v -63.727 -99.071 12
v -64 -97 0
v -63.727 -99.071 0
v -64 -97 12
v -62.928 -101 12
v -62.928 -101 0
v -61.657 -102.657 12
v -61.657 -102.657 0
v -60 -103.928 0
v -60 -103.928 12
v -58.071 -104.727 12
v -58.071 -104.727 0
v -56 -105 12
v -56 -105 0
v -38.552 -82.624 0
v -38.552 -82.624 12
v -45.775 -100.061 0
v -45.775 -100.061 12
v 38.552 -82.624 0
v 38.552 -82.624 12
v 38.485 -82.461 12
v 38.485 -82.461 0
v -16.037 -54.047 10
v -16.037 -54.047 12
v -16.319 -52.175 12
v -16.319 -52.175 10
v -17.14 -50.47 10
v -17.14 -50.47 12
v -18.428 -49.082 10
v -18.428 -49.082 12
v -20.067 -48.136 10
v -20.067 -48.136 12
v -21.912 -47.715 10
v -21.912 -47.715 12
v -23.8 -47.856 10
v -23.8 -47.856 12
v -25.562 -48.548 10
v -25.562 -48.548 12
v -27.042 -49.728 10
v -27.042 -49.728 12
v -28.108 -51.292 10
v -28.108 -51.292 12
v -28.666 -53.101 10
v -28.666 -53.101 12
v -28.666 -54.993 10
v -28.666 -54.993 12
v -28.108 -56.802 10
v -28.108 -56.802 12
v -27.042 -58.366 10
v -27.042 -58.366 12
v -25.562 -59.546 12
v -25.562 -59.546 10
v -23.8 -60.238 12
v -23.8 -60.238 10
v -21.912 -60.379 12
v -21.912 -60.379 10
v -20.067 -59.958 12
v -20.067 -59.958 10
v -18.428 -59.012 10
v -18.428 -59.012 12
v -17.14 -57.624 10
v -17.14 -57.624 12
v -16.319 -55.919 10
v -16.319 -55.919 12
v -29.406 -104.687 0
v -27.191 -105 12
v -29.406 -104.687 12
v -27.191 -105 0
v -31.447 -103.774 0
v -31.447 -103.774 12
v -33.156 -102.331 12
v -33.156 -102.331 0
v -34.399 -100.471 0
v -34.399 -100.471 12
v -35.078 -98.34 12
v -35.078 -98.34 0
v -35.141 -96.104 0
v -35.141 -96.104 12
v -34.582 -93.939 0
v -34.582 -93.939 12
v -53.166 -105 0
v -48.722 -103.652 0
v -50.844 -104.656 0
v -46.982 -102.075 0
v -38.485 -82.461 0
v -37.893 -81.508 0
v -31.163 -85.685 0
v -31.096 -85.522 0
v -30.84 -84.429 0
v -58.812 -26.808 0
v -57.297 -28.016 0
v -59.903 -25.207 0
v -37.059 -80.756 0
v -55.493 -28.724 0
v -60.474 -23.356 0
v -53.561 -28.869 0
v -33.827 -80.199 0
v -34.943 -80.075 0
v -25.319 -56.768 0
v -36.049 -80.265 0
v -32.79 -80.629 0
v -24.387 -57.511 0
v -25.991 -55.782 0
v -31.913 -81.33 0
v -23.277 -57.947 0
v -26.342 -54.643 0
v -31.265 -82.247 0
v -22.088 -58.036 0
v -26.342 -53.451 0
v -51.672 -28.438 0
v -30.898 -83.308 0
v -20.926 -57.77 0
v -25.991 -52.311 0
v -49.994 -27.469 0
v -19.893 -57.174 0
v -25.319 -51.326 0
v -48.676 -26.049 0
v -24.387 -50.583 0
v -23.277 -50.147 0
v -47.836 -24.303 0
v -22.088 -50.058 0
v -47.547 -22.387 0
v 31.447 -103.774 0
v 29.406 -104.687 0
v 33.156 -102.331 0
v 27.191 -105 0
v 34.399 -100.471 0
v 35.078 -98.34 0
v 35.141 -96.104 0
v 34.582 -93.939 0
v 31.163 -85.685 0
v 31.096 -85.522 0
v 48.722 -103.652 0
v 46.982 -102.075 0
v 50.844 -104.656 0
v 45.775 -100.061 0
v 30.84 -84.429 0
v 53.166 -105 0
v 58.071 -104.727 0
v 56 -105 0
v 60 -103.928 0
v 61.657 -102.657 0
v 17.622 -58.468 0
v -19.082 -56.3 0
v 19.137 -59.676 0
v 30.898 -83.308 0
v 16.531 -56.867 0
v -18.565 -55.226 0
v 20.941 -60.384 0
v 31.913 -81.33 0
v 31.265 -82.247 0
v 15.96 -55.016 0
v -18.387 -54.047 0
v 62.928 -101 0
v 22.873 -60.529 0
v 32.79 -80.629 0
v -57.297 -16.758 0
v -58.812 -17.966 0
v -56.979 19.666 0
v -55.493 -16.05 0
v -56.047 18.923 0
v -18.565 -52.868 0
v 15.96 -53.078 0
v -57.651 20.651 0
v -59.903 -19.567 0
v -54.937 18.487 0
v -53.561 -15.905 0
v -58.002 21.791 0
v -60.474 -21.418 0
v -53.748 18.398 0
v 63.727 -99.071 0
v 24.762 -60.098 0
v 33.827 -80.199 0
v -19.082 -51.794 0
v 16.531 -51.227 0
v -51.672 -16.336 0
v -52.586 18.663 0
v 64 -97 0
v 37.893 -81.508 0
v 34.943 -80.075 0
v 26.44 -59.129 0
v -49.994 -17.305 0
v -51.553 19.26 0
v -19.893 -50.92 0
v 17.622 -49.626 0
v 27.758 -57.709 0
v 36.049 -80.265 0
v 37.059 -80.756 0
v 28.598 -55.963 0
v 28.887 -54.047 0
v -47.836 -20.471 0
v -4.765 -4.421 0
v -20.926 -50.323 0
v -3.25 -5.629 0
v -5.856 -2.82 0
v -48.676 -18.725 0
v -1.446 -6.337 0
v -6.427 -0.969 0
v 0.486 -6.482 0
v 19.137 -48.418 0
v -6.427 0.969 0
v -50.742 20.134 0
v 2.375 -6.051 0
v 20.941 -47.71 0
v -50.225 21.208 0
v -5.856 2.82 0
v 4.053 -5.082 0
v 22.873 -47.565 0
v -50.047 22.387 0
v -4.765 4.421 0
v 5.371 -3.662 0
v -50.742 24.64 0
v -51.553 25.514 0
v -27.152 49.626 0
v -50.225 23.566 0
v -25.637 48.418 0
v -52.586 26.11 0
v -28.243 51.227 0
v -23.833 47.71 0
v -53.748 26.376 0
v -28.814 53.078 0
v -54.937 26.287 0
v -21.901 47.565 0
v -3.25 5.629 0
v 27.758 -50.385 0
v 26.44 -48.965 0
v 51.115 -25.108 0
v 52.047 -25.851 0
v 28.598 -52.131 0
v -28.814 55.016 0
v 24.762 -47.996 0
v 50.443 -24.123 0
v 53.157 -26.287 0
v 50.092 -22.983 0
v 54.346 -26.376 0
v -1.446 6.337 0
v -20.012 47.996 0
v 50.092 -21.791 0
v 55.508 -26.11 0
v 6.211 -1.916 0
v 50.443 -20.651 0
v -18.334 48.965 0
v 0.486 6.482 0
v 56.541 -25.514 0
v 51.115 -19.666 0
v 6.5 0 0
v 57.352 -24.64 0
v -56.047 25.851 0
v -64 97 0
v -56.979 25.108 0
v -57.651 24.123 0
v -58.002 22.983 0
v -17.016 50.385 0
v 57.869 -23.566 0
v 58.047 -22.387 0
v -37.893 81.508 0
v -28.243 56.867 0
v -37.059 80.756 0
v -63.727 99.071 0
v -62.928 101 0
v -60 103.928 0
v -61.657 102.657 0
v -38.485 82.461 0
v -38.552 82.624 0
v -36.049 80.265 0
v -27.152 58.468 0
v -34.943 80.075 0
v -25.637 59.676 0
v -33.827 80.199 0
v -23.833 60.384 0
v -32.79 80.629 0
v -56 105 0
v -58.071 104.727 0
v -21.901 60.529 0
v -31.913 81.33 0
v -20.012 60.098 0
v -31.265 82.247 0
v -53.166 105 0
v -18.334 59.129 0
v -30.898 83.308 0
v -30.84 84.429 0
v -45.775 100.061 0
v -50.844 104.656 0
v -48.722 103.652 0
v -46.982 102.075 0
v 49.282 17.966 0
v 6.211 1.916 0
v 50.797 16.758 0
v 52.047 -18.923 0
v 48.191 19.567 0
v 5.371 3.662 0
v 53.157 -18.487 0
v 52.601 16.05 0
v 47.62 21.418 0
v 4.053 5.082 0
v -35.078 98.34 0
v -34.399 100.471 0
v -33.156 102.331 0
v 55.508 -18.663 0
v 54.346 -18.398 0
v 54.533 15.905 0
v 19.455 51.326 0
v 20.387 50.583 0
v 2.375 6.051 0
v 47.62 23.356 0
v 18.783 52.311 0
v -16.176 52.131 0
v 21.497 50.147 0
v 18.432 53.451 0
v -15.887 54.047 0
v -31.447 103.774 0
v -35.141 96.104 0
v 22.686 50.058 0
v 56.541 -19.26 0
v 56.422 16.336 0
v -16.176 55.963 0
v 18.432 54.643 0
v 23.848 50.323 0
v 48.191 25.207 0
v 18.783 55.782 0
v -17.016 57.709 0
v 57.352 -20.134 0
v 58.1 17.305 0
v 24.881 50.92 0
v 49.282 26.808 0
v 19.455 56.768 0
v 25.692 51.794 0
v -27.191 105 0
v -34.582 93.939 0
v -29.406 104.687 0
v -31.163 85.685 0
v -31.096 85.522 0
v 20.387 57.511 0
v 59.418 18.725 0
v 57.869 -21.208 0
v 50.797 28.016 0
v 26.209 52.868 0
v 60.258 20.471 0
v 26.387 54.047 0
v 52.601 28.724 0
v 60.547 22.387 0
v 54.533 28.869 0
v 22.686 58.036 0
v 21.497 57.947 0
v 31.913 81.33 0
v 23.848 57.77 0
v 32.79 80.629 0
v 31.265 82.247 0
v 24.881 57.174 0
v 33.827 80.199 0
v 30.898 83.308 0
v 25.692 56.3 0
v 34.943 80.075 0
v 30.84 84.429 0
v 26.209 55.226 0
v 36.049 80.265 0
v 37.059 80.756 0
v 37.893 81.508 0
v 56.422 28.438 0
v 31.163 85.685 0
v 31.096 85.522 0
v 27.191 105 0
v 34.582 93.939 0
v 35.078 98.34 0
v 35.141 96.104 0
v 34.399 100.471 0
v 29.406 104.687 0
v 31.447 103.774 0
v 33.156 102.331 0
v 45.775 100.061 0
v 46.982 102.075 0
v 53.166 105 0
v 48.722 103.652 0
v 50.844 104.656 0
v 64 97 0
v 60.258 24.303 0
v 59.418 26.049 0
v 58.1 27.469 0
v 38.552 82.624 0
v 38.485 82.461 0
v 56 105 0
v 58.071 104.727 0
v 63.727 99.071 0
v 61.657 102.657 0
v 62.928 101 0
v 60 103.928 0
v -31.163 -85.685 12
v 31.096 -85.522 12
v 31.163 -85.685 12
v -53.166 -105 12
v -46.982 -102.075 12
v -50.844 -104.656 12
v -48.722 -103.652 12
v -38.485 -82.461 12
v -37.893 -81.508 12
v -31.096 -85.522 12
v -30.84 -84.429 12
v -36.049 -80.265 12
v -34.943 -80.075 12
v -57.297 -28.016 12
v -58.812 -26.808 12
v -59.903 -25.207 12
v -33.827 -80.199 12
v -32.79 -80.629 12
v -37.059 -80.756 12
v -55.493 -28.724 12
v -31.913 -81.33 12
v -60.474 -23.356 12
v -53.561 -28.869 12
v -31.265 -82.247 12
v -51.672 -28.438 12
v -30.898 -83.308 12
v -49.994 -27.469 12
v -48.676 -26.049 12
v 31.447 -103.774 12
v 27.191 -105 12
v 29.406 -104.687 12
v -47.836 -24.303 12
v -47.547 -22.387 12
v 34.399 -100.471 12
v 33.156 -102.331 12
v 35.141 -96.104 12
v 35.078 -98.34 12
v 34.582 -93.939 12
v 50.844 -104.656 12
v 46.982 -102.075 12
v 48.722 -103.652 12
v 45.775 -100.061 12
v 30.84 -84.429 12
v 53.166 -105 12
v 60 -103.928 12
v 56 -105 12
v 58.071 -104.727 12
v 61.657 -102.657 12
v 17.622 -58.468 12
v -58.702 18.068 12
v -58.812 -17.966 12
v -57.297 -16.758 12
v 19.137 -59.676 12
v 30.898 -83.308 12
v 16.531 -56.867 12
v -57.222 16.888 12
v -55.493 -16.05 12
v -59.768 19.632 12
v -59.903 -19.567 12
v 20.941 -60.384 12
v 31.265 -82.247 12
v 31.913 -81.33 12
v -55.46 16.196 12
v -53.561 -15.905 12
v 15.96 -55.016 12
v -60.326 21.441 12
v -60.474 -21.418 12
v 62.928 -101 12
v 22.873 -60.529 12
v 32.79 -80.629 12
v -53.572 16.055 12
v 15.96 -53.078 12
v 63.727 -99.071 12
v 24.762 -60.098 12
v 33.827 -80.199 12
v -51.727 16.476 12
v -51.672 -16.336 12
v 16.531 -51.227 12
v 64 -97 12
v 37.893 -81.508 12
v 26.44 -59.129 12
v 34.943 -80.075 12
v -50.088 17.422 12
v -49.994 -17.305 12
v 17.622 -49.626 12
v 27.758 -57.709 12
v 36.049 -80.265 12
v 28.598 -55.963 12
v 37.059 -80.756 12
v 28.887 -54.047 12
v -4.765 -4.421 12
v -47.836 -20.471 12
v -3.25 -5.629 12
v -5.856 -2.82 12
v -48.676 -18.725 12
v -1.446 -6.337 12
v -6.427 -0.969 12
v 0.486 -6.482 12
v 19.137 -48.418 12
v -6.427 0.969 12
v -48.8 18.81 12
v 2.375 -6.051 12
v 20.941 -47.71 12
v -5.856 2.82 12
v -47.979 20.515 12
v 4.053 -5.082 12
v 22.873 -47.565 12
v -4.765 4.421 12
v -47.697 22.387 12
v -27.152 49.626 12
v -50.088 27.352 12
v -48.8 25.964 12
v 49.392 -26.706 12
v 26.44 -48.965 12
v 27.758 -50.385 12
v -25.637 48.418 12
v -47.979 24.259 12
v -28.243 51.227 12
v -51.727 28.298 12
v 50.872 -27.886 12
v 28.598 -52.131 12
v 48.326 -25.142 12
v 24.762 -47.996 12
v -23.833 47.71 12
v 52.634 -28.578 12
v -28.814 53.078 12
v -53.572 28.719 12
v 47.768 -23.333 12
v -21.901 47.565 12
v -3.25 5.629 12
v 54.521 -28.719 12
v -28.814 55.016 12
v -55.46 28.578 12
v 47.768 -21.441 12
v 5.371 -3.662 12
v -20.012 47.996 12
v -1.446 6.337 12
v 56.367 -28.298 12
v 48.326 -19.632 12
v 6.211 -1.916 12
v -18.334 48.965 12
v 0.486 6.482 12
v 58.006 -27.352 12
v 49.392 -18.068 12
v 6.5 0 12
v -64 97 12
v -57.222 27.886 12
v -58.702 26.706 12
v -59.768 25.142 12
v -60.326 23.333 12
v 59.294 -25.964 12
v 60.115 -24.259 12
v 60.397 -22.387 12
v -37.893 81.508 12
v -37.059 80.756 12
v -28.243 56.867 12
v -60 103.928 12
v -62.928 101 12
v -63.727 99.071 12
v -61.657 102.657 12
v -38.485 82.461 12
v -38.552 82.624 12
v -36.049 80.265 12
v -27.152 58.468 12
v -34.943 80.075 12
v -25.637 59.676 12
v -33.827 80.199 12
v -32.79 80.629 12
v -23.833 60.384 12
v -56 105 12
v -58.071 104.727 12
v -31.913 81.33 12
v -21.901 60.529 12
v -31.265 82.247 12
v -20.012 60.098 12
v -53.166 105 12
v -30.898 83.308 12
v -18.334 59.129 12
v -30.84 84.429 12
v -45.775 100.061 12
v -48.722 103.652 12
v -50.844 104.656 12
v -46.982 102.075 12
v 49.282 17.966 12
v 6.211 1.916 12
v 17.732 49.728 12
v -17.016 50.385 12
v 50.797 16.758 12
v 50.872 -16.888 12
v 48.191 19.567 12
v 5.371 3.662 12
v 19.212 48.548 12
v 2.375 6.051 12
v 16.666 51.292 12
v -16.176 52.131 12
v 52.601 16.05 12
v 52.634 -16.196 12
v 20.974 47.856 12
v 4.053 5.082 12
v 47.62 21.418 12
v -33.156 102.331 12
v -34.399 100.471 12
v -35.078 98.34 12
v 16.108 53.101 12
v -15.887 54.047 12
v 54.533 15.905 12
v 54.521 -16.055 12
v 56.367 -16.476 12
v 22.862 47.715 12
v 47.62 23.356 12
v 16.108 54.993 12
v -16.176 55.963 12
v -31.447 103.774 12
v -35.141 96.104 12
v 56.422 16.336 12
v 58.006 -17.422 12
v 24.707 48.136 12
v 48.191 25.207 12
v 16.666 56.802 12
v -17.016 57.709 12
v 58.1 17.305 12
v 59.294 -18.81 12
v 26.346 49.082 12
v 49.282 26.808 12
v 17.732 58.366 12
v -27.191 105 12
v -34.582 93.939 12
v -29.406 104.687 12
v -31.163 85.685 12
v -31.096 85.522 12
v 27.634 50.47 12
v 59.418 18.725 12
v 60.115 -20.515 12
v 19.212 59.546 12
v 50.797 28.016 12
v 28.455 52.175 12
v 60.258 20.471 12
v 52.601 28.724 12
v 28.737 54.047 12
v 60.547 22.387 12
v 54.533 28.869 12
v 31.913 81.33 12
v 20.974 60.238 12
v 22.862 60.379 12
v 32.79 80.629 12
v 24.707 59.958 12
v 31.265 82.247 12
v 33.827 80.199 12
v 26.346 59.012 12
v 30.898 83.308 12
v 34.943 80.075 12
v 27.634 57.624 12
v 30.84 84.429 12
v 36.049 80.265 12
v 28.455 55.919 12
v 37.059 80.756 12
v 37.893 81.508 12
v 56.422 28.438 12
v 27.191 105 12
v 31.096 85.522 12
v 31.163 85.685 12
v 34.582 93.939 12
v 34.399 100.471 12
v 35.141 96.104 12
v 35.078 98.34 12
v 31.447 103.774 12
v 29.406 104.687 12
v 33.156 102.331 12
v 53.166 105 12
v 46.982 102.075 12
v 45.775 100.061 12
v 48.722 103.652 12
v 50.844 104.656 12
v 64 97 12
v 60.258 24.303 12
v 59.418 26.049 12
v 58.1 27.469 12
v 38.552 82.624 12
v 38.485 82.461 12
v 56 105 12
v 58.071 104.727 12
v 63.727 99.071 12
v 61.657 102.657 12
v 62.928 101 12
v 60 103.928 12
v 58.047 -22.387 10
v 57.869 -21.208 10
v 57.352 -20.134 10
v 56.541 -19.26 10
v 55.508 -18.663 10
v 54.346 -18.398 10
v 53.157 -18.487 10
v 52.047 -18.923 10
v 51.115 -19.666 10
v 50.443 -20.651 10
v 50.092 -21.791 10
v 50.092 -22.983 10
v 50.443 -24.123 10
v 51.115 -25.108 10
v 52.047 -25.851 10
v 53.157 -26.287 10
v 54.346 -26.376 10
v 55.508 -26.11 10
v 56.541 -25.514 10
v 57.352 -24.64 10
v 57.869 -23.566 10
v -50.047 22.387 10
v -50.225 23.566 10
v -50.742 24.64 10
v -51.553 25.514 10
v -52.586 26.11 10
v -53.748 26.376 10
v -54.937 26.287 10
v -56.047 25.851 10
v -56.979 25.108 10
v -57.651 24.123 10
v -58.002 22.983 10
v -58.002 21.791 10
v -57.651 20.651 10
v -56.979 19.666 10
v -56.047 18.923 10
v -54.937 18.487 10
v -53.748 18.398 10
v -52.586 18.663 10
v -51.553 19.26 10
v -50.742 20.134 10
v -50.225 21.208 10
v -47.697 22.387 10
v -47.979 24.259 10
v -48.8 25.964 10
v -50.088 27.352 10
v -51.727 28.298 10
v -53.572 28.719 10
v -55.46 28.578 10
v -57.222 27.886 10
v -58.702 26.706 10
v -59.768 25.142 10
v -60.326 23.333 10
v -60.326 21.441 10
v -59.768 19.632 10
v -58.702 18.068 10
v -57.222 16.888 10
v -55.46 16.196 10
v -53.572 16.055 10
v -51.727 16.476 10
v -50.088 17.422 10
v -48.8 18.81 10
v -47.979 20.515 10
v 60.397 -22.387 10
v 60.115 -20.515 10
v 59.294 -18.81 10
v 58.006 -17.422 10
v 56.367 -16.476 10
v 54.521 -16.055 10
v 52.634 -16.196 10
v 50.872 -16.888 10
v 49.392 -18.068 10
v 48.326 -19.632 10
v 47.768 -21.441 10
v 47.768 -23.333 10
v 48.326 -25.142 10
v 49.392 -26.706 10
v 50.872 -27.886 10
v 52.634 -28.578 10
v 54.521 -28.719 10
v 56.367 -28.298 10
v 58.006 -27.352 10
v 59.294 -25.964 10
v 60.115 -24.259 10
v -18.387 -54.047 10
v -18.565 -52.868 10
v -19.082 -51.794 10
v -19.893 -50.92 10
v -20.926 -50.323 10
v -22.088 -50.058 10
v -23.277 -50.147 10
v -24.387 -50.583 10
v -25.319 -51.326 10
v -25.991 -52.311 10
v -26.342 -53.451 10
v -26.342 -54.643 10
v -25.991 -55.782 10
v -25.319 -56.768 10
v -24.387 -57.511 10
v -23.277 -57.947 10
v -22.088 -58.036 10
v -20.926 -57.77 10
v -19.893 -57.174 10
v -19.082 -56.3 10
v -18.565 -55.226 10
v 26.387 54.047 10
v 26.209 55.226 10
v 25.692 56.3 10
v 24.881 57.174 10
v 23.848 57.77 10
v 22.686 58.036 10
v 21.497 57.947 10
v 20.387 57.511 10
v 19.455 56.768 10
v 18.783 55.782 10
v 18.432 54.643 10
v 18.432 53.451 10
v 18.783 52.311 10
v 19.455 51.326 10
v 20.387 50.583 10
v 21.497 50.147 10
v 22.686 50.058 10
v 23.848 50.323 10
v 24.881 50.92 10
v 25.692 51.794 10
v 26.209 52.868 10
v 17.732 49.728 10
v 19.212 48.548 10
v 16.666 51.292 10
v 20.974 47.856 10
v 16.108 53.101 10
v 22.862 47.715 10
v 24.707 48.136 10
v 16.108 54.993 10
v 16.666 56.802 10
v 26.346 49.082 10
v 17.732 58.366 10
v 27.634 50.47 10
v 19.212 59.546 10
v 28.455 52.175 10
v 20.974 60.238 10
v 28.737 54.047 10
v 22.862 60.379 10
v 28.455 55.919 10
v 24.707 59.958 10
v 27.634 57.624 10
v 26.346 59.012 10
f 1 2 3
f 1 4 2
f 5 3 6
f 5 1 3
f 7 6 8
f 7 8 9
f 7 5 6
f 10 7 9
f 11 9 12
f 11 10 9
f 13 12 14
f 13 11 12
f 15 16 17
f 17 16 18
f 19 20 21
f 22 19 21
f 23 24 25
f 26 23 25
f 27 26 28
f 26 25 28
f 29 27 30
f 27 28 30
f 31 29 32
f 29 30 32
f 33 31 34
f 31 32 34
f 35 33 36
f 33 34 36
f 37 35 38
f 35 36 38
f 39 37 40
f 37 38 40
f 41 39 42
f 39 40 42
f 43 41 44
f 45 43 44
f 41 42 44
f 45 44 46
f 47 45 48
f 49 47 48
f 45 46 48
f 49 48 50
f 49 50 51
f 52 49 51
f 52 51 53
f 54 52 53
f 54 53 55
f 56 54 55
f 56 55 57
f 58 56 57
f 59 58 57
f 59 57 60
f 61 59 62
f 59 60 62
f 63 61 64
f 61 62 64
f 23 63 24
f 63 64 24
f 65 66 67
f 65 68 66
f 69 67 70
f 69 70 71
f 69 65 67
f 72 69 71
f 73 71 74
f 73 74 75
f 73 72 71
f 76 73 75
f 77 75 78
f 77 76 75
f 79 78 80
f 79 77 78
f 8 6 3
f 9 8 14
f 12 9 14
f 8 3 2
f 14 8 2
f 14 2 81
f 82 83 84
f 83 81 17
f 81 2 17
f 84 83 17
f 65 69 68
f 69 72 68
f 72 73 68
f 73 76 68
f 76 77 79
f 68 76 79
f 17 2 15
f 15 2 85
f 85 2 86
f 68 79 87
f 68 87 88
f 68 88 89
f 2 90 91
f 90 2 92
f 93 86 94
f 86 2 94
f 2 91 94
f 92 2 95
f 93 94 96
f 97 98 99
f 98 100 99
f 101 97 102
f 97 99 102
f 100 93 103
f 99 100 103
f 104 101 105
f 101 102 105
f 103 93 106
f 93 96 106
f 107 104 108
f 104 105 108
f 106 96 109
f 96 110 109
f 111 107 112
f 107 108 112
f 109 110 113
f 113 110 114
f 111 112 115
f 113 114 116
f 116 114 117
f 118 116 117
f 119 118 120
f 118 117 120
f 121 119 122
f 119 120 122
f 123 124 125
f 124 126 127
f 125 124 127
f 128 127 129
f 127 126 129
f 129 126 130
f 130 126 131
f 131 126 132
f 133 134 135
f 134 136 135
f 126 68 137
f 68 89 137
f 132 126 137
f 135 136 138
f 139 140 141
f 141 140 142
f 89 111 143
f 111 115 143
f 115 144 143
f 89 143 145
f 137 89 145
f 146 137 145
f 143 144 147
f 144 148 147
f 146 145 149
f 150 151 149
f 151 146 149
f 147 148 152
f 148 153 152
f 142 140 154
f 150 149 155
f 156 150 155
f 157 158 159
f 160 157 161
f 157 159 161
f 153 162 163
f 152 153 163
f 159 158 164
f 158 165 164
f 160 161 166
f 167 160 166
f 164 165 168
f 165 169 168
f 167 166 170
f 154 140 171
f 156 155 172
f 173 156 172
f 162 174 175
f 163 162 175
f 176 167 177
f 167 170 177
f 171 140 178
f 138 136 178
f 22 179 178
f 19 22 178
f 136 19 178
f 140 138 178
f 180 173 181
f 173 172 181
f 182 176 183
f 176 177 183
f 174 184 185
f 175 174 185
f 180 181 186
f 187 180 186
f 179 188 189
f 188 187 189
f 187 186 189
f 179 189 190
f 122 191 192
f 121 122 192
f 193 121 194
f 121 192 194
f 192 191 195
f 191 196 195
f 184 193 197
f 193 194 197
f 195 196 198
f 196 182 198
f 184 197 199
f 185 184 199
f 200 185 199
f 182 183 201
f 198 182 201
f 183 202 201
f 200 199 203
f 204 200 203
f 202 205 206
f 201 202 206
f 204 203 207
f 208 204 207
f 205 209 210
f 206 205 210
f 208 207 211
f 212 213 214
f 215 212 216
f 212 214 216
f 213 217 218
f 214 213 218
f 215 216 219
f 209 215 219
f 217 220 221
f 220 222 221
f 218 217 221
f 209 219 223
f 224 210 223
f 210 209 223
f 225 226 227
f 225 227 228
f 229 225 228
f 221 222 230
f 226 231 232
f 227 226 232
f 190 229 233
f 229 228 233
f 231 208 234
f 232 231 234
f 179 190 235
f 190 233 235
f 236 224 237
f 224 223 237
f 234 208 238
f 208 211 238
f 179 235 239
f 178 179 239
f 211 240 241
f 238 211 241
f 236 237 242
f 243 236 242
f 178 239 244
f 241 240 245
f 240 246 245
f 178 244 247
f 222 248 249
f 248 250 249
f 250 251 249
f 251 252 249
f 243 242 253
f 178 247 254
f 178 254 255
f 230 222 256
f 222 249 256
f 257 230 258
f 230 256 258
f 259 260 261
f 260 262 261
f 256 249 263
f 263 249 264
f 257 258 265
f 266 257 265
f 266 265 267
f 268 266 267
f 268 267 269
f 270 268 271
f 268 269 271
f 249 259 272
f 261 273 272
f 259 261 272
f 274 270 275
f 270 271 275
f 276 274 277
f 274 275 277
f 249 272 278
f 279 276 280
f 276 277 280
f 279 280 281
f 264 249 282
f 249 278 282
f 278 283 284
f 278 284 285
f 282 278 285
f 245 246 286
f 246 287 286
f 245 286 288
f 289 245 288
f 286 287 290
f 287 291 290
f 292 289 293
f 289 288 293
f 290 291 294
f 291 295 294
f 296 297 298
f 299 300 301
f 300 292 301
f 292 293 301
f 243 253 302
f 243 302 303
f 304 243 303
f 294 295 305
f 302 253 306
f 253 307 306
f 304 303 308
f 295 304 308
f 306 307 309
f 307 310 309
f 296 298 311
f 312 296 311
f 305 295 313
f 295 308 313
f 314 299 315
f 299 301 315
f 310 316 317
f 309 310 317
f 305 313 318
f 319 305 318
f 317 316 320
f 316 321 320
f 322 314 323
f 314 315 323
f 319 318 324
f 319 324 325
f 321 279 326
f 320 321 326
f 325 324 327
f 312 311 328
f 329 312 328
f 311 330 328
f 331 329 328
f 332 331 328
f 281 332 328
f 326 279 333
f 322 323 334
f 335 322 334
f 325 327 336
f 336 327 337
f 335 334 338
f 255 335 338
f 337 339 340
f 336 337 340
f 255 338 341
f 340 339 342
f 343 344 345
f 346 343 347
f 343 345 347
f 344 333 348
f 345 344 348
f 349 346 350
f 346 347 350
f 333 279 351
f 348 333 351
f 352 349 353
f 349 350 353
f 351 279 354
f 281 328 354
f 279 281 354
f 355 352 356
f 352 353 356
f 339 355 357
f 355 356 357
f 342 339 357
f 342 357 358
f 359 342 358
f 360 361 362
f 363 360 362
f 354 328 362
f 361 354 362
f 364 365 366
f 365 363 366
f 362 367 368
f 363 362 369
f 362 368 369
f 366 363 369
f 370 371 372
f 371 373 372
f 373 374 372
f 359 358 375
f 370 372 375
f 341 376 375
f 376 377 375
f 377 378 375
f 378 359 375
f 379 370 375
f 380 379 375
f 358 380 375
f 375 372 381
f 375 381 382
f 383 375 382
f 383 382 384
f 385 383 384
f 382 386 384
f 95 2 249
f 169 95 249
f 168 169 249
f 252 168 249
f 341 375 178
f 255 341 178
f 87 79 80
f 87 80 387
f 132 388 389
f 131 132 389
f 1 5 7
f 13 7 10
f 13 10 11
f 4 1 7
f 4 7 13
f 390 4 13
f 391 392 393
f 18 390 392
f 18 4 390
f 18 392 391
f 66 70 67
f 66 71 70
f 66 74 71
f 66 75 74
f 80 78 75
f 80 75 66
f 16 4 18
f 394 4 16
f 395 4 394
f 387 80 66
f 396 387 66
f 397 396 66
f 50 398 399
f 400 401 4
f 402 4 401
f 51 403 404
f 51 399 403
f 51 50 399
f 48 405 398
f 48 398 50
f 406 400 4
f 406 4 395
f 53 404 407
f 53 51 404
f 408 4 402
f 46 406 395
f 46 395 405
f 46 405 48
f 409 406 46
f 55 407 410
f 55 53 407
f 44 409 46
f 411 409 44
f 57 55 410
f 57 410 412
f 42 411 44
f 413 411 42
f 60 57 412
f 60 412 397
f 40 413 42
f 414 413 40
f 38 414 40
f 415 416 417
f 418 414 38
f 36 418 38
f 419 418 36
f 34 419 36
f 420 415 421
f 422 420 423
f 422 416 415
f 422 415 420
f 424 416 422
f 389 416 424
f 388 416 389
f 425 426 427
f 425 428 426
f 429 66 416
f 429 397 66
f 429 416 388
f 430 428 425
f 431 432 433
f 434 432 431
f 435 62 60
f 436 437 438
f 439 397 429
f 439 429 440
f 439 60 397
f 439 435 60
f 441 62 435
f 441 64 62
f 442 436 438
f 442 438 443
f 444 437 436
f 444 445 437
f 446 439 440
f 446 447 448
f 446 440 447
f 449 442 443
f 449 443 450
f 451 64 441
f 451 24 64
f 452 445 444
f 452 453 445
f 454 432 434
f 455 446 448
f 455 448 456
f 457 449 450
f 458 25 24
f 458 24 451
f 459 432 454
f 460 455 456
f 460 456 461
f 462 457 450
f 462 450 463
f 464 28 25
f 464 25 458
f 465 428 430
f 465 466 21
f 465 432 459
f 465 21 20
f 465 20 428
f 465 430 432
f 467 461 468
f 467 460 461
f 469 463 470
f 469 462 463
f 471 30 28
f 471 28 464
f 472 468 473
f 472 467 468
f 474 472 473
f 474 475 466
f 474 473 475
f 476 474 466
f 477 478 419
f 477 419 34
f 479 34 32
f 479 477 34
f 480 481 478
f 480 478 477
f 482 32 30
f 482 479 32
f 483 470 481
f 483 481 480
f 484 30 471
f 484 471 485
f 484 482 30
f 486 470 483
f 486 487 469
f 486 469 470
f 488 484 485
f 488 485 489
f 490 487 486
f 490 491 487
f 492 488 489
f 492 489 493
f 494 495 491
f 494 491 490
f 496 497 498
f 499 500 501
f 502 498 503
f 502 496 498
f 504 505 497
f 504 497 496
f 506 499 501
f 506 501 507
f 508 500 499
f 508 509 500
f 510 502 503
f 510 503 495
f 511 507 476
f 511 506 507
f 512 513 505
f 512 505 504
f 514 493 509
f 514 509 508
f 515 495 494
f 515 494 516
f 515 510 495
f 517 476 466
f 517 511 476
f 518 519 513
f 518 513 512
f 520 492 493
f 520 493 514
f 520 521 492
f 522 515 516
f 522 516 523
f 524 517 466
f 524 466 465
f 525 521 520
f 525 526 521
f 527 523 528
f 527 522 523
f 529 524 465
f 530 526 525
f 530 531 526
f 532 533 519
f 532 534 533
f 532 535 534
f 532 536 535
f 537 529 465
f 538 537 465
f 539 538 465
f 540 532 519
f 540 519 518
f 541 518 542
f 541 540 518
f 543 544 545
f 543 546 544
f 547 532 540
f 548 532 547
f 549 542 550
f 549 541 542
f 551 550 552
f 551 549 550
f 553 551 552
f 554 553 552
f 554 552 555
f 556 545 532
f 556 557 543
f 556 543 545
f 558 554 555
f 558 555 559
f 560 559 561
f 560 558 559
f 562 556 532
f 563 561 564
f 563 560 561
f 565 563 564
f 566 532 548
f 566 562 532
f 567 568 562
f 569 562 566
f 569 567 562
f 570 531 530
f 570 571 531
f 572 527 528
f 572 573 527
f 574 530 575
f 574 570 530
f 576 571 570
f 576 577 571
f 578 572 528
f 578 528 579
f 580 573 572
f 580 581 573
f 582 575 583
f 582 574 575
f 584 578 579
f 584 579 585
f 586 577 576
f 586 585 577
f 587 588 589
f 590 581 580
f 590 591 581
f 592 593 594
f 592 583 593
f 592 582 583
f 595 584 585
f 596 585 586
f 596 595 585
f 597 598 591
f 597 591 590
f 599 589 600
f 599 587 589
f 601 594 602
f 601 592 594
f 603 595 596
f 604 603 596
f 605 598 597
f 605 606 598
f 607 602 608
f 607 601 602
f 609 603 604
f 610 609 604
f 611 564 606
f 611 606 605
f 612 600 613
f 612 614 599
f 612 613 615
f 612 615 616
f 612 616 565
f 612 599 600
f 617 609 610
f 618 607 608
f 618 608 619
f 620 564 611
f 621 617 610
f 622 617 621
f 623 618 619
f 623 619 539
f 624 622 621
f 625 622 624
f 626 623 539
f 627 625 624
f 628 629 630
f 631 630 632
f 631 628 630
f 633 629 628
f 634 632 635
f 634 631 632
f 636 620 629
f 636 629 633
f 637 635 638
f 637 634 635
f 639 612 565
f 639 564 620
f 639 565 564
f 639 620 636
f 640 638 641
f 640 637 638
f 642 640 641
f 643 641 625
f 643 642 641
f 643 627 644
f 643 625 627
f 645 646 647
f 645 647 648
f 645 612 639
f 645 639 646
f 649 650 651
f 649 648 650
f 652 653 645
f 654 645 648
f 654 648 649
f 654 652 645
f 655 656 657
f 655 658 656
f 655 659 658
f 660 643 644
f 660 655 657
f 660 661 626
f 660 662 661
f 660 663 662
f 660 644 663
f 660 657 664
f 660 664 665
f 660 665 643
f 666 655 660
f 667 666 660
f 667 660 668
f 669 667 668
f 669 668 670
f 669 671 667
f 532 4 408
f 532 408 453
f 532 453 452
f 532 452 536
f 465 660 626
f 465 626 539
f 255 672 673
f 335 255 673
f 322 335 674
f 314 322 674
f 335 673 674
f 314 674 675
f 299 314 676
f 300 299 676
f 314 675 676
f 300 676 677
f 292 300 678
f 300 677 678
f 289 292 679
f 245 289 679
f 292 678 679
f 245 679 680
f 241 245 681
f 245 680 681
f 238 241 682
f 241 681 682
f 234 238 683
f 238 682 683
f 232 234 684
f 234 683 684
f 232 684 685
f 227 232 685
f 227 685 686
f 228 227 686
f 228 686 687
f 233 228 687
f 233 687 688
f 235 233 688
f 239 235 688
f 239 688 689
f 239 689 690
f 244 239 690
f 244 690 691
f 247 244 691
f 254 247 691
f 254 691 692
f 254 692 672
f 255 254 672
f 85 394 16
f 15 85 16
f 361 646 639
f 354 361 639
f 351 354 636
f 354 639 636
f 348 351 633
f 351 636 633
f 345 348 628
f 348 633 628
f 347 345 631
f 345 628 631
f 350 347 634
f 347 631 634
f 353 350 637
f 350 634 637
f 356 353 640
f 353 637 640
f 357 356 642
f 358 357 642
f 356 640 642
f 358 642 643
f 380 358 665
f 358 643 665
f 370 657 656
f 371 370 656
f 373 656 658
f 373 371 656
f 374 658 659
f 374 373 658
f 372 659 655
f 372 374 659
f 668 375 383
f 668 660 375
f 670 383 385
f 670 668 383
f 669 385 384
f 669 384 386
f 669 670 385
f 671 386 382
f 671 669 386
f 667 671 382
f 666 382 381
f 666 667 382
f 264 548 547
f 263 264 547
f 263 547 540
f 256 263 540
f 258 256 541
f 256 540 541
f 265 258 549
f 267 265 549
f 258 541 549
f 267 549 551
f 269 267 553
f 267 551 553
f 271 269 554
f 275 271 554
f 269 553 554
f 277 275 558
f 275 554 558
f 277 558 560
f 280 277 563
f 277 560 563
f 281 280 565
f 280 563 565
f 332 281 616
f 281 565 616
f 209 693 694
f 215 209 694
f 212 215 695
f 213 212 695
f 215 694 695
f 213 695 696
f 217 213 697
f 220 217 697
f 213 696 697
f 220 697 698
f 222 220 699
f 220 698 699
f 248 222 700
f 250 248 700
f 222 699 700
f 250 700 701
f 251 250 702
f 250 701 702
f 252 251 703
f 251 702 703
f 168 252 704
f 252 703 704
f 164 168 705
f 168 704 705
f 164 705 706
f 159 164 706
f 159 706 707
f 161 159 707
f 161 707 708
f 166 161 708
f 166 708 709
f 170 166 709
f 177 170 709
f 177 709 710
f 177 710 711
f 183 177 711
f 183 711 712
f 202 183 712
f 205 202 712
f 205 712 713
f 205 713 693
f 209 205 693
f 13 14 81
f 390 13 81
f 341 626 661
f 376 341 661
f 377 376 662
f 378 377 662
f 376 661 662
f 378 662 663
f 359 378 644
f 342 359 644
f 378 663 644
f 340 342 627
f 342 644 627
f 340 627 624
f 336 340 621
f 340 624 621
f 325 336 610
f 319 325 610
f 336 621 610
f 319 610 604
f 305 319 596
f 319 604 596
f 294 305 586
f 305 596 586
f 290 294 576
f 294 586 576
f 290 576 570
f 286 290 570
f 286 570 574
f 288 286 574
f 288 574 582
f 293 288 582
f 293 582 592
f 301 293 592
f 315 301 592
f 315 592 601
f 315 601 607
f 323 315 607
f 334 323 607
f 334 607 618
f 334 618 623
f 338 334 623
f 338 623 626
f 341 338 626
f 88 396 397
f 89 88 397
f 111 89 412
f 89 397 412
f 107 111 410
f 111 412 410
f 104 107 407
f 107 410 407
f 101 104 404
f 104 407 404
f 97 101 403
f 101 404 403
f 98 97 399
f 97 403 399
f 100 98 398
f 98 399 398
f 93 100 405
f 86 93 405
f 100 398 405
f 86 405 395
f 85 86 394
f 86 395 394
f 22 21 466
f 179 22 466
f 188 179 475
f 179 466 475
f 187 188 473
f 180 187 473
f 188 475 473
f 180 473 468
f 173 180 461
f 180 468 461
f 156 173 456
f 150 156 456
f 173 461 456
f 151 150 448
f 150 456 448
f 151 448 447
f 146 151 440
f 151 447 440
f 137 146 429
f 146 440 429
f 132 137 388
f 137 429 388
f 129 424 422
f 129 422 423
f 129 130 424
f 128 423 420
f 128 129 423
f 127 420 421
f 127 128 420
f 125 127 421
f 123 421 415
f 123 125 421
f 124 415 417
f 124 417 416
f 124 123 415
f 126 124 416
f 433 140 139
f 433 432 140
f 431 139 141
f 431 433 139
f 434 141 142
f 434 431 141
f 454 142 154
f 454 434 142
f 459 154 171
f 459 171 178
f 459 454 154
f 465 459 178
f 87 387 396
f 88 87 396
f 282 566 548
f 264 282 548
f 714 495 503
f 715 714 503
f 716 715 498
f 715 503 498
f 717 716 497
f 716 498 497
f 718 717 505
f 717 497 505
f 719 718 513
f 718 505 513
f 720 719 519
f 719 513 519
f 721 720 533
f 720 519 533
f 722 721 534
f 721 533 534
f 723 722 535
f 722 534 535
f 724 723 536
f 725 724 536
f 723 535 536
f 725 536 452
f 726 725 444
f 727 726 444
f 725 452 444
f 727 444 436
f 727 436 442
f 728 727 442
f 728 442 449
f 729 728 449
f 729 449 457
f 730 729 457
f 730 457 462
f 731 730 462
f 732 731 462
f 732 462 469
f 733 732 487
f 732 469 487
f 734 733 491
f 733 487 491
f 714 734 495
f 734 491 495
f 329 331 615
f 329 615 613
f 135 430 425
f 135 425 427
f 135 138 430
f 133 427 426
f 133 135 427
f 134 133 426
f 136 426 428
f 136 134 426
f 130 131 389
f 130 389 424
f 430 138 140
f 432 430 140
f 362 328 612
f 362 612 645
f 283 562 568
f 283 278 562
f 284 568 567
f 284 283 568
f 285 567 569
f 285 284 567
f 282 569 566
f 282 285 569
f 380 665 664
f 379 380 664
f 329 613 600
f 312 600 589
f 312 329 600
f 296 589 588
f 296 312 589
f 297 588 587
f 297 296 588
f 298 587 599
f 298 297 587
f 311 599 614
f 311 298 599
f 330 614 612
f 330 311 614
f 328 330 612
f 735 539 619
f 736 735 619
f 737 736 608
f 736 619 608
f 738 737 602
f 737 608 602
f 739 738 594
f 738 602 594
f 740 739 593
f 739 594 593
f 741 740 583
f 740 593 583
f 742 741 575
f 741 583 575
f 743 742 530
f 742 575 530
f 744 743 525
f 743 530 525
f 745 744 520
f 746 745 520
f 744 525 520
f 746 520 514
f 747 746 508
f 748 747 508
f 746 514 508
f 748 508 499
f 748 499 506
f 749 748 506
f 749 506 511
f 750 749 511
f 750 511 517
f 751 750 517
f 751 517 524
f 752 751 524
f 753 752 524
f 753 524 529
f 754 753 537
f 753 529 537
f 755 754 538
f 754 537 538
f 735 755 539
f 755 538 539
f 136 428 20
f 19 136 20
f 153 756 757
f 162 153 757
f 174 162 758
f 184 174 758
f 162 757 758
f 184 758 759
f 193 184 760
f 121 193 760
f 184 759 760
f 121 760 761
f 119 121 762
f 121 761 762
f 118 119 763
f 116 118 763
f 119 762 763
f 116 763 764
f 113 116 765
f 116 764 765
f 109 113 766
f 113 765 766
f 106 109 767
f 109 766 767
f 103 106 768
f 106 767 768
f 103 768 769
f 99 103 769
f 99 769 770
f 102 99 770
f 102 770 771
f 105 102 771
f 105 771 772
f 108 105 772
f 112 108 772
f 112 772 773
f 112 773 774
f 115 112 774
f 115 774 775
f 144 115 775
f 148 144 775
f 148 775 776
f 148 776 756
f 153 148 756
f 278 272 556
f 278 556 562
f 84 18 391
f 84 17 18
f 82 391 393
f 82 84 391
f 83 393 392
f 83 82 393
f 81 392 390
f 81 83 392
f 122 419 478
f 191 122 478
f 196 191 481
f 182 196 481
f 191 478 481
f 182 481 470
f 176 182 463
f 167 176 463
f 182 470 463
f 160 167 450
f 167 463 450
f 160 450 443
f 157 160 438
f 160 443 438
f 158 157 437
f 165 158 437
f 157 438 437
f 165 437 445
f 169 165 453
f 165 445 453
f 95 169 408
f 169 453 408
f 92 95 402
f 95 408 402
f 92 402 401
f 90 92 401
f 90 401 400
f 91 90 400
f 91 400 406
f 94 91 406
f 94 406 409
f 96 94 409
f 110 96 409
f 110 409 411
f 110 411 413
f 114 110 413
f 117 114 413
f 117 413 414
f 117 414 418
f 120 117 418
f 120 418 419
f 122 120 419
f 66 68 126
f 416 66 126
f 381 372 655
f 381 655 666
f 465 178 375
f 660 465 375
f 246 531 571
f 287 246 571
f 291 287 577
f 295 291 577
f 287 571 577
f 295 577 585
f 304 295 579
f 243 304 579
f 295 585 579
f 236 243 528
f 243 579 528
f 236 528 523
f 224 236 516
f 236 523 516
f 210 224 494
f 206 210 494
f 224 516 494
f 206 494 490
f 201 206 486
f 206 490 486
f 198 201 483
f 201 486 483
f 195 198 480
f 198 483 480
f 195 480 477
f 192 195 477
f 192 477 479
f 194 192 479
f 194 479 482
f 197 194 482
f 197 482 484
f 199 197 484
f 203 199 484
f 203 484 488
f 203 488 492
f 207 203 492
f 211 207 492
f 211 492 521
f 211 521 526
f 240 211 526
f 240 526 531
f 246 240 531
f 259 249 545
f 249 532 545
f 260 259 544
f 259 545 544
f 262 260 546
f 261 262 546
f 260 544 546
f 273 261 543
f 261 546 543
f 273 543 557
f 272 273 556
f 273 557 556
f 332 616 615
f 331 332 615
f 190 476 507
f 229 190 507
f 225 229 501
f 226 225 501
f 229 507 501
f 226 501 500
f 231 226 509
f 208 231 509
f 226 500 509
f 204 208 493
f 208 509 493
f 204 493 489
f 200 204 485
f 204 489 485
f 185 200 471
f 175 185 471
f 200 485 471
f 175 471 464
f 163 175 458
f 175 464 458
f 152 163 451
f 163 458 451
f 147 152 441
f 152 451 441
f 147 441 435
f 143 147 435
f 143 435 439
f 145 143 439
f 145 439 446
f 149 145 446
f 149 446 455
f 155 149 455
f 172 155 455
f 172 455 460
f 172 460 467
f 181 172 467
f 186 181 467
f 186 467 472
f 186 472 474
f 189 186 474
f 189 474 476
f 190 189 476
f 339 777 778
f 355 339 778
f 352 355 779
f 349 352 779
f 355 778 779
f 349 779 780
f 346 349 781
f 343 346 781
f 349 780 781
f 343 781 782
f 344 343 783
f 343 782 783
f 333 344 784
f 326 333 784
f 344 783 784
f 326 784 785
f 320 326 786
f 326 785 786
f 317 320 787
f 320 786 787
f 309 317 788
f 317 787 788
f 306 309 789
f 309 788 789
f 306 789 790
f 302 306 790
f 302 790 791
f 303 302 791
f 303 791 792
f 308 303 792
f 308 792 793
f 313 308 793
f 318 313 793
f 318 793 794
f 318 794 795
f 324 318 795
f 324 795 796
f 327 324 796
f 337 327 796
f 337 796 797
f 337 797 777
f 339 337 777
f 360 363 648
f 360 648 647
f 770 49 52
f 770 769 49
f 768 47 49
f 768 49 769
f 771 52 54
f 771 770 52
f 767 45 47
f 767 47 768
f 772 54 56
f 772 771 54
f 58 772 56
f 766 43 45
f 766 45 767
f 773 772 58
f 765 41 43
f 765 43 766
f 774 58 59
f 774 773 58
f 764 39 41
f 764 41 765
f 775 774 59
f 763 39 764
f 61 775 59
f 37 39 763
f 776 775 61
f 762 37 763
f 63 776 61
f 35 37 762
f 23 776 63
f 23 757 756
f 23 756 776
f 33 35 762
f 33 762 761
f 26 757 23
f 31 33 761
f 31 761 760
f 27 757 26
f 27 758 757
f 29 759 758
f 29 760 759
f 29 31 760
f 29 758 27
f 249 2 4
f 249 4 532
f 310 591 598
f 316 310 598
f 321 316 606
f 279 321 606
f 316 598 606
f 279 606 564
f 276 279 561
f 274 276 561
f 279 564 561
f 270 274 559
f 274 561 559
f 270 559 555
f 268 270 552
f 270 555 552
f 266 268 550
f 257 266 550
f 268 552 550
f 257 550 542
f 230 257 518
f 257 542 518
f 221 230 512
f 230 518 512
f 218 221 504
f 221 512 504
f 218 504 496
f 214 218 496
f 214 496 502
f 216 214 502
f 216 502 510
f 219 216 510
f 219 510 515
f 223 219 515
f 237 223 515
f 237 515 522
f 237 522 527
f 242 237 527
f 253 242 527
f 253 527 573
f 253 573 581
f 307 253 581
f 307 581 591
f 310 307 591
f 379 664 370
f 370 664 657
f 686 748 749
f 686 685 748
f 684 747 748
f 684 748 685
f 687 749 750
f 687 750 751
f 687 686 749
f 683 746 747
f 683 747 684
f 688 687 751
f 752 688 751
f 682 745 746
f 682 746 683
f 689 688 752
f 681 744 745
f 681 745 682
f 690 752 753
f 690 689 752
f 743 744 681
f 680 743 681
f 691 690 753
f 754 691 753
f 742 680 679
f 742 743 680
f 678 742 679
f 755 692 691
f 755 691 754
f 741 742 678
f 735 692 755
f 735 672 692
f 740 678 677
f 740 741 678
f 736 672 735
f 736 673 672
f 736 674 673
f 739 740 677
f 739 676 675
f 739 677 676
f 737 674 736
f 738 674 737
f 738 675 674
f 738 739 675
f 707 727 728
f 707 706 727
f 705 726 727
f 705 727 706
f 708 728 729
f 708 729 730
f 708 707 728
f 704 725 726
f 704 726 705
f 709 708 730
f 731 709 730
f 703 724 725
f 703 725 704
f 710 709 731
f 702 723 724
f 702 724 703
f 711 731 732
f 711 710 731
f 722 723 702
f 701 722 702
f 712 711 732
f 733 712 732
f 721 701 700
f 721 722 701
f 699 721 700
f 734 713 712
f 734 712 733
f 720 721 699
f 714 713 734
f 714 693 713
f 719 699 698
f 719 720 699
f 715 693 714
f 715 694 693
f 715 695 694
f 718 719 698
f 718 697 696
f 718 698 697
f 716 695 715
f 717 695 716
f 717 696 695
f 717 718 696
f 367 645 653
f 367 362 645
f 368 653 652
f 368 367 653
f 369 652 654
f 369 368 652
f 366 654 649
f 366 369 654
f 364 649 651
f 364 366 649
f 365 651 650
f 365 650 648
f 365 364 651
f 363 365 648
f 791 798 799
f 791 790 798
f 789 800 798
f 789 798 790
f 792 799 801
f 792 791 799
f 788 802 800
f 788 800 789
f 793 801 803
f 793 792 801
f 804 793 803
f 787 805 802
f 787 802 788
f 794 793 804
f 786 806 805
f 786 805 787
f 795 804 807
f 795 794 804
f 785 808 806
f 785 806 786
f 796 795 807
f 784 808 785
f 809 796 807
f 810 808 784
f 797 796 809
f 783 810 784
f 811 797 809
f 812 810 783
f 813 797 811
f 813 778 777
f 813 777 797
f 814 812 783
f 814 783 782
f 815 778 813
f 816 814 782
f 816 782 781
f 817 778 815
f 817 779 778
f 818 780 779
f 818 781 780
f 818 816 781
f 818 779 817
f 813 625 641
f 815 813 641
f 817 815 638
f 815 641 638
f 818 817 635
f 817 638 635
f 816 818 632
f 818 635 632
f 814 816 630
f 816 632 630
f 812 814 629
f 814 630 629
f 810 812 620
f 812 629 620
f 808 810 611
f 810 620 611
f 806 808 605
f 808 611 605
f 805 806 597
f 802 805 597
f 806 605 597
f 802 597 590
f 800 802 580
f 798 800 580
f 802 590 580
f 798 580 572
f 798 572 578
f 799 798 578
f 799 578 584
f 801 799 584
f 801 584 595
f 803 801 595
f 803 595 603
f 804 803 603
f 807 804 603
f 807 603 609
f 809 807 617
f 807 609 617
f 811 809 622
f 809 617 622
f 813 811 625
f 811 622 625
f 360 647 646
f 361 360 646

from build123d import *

# Parameters (mm, degrees)
F0_W      = 128
F0_H      = 210
F1_DEPTH  = 12
F2_R      = 8
F3_R      = 6.5
F3_R_2    = 4
F4_DEPTH  = 25
F3_R_3    = 6.35
F5_DEPTH  = 2
F7_DEPTH  = 25
F8_R      = 8
F10_R     = 6.5
F11_DEPTH = 25


with BuildPart() as f1:
    # F0 (on Top) → F1 (new body)
    with BuildSketch(Plane.XY):
        Rectangle(F0_W, F0_H)
    extrude(amount=F1_DEPTH)

    # F2
    f2_edges = [f1.edges().sort_by_distance(p)[0] for p in [
        (-64, -105, 6),
        (64, -105, 6),
        (64, 105, 6),
        (-64, 105, 6),
    ]]
    fillet(f2_edges, radius=F2_R)

    # F3 (on face) → F4 (cut)
    with BuildSketch(Plane.XY.offset(12)):
        with Locations((-22.3869807934, 54.0469526519)):
            Circle(F3_R)
        with Locations((-54.0469526519, 22.3869807934)):
            Circle(F3_R_2)
        with Locations((-54.0469526519, -22.3869807934)):
            Circle(F3_R)
        with Locations((-22.3869807934, -54.0469526519)):
            Circle(F3_R_2)
        with Locations((22.3869807934, -54.0469526519)):
            Circle(F3_R)
        with Locations((54.0469526519, -22.3869807934)):
            Circle(F3_R_2)
        with Locations((54.0469526519, 22.3869807934)):
            Circle(F3_R)
        with Locations((22.3869807934, 54.0469526519)):
            Circle(F3_R_2)
    extrude(amount=-F4_DEPTH, mode=Mode.SUBTRACT)

    # F3 (on face) → F5 (cut)
    with BuildSketch(Plane.XY.offset(12)):
        with Locations((-54.0469526519, 22.3869807934)):
            Circle(F3_R_3)
        with Locations((-54.0469526519, 22.3869807934)):
            Circle(F3_R_2, mode=Mode.SUBTRACT)
        with Locations((-22.3869807934, -54.0469526519)):
            Circle(F3_R_3)
        with Locations((-22.3869807934, -54.0469526519)):
            Circle(F3_R_2, mode=Mode.SUBTRACT)
        with Locations((54.0469526519, -22.3869807934)):
            Circle(F3_R_3)
        with Locations((54.0469526519, -22.3869807934)):
            Circle(F3_R_2, mode=Mode.SUBTRACT)
        with Locations((22.3869807934, 54.0469526519)):
            Circle(F3_R_3)
        with Locations((22.3869807934, 54.0469526519)):
            Circle(F3_R_2, mode=Mode.SUBTRACT)
    extrude(amount=-F5_DEPTH, mode=Mode.SUBTRACT)

    # F6 (on face) → F7 (cut)
    with BuildSketch(Plane.XY.offset(12)):
        with BuildLine():
            Line((-47.8209470608, 105), (-38.5524603376, 82.6238936502))
            Line((-38.5524603376, 82.6238936502), (-38.4851753385, 82.4614532928))
            ThreePointArc((-38.4851753385, 82.4614532928), (-33.2934586158, 80.3775193285), (-31.0959243529, 85.5221812669))
            Line((-31.0959243529, 85.5221812669), (-31.163209352, 85.6846216242))
            Line((-31.163209352, 85.6846216242), (-39.1639010376, 105))
            Line((-39.1639010376, 105), (-47.8209470608, 105))
        make_face()
        with BuildLine():
            Line((-38.5524603376, -82.6238936502), (-47.8209470608, -105))
            Line((-47.8209470608, -105), (-39.1639010376, -105))
            Line((-39.1639010376, -105), (-31.163209352, -85.6846216242))
            Line((-31.163209352, -85.6846216242), (-31.0959243529, -85.5221812669))
            ThreePointArc((-31.0959243529, -85.5221812669), (-33.2934586158, -80.3775193285), (-38.4851753385, -82.4614532928))
            Line((-38.4851753385, -82.4614532928), (-38.5524603376, -82.6238936502))
        make_face()
        with BuildLine():
            Line((31.163209352, -85.6846216242), (39.1639010376, -105))
            Line((39.1639010376, -105), (47.8209470608, -105))
            Line((47.8209470608, -105), (38.5524603376, -82.6238936502))
            Line((38.5524603376, -82.6238936502), (38.4851753385, -82.4614532928))
            ThreePointArc((38.4851753385, -82.4614532928), (33.2934586158, -80.3775193285), (31.0959243529, -85.5221812669))
            Line((31.0959243529, -85.5221812669), (31.163209352, -85.6846216242))
        make_face()
        with BuildLine():
            Line((47.8209470608, 105), (39.1639010376, 105))
            Line((39.1639010376, 105), (31.163209352, 85.6846216242))
            Line((31.163209352, 85.6846216242), (31.0959243529, 85.5221812669))
            ThreePointArc((31.0959243529, 85.5221812669), (33.2934586158, 80.3775193285), (38.4851753385, 82.4614532928))
            Line((38.4851753385, 82.4614532928), (38.5524603376, 82.6238936502))
            Line((38.5524603376, 82.6238936502), (47.8209470608, 105))
        make_face()
    extrude(amount=-F7_DEPTH, mode=Mode.SUBTRACT)

    # F8
    f8_edges = [f1.edges().sort_by_distance(p)[0] for p in [
        (-47.820947, 105, 6),
        (-39.163901, 105, 6),
        (39.163901, 105, 6),
        (47.820947, 105, 6),
        (47.820947, -105, 6),
        (39.163901, -105, 6),
        (-39.163901, -105, 6),
        (-47.820947, -105, 6),
    ]]
    fillet(f8_edges, radius=F8_R)

    # F10 (on face) → F11 (cut)
    with BuildSketch(Plane.XY.offset(12)):
        Circle(F10_R)
    extrude(amount=-F11_DEPTH, mode=Mode.SUBTRACT)


solid = f1.part
